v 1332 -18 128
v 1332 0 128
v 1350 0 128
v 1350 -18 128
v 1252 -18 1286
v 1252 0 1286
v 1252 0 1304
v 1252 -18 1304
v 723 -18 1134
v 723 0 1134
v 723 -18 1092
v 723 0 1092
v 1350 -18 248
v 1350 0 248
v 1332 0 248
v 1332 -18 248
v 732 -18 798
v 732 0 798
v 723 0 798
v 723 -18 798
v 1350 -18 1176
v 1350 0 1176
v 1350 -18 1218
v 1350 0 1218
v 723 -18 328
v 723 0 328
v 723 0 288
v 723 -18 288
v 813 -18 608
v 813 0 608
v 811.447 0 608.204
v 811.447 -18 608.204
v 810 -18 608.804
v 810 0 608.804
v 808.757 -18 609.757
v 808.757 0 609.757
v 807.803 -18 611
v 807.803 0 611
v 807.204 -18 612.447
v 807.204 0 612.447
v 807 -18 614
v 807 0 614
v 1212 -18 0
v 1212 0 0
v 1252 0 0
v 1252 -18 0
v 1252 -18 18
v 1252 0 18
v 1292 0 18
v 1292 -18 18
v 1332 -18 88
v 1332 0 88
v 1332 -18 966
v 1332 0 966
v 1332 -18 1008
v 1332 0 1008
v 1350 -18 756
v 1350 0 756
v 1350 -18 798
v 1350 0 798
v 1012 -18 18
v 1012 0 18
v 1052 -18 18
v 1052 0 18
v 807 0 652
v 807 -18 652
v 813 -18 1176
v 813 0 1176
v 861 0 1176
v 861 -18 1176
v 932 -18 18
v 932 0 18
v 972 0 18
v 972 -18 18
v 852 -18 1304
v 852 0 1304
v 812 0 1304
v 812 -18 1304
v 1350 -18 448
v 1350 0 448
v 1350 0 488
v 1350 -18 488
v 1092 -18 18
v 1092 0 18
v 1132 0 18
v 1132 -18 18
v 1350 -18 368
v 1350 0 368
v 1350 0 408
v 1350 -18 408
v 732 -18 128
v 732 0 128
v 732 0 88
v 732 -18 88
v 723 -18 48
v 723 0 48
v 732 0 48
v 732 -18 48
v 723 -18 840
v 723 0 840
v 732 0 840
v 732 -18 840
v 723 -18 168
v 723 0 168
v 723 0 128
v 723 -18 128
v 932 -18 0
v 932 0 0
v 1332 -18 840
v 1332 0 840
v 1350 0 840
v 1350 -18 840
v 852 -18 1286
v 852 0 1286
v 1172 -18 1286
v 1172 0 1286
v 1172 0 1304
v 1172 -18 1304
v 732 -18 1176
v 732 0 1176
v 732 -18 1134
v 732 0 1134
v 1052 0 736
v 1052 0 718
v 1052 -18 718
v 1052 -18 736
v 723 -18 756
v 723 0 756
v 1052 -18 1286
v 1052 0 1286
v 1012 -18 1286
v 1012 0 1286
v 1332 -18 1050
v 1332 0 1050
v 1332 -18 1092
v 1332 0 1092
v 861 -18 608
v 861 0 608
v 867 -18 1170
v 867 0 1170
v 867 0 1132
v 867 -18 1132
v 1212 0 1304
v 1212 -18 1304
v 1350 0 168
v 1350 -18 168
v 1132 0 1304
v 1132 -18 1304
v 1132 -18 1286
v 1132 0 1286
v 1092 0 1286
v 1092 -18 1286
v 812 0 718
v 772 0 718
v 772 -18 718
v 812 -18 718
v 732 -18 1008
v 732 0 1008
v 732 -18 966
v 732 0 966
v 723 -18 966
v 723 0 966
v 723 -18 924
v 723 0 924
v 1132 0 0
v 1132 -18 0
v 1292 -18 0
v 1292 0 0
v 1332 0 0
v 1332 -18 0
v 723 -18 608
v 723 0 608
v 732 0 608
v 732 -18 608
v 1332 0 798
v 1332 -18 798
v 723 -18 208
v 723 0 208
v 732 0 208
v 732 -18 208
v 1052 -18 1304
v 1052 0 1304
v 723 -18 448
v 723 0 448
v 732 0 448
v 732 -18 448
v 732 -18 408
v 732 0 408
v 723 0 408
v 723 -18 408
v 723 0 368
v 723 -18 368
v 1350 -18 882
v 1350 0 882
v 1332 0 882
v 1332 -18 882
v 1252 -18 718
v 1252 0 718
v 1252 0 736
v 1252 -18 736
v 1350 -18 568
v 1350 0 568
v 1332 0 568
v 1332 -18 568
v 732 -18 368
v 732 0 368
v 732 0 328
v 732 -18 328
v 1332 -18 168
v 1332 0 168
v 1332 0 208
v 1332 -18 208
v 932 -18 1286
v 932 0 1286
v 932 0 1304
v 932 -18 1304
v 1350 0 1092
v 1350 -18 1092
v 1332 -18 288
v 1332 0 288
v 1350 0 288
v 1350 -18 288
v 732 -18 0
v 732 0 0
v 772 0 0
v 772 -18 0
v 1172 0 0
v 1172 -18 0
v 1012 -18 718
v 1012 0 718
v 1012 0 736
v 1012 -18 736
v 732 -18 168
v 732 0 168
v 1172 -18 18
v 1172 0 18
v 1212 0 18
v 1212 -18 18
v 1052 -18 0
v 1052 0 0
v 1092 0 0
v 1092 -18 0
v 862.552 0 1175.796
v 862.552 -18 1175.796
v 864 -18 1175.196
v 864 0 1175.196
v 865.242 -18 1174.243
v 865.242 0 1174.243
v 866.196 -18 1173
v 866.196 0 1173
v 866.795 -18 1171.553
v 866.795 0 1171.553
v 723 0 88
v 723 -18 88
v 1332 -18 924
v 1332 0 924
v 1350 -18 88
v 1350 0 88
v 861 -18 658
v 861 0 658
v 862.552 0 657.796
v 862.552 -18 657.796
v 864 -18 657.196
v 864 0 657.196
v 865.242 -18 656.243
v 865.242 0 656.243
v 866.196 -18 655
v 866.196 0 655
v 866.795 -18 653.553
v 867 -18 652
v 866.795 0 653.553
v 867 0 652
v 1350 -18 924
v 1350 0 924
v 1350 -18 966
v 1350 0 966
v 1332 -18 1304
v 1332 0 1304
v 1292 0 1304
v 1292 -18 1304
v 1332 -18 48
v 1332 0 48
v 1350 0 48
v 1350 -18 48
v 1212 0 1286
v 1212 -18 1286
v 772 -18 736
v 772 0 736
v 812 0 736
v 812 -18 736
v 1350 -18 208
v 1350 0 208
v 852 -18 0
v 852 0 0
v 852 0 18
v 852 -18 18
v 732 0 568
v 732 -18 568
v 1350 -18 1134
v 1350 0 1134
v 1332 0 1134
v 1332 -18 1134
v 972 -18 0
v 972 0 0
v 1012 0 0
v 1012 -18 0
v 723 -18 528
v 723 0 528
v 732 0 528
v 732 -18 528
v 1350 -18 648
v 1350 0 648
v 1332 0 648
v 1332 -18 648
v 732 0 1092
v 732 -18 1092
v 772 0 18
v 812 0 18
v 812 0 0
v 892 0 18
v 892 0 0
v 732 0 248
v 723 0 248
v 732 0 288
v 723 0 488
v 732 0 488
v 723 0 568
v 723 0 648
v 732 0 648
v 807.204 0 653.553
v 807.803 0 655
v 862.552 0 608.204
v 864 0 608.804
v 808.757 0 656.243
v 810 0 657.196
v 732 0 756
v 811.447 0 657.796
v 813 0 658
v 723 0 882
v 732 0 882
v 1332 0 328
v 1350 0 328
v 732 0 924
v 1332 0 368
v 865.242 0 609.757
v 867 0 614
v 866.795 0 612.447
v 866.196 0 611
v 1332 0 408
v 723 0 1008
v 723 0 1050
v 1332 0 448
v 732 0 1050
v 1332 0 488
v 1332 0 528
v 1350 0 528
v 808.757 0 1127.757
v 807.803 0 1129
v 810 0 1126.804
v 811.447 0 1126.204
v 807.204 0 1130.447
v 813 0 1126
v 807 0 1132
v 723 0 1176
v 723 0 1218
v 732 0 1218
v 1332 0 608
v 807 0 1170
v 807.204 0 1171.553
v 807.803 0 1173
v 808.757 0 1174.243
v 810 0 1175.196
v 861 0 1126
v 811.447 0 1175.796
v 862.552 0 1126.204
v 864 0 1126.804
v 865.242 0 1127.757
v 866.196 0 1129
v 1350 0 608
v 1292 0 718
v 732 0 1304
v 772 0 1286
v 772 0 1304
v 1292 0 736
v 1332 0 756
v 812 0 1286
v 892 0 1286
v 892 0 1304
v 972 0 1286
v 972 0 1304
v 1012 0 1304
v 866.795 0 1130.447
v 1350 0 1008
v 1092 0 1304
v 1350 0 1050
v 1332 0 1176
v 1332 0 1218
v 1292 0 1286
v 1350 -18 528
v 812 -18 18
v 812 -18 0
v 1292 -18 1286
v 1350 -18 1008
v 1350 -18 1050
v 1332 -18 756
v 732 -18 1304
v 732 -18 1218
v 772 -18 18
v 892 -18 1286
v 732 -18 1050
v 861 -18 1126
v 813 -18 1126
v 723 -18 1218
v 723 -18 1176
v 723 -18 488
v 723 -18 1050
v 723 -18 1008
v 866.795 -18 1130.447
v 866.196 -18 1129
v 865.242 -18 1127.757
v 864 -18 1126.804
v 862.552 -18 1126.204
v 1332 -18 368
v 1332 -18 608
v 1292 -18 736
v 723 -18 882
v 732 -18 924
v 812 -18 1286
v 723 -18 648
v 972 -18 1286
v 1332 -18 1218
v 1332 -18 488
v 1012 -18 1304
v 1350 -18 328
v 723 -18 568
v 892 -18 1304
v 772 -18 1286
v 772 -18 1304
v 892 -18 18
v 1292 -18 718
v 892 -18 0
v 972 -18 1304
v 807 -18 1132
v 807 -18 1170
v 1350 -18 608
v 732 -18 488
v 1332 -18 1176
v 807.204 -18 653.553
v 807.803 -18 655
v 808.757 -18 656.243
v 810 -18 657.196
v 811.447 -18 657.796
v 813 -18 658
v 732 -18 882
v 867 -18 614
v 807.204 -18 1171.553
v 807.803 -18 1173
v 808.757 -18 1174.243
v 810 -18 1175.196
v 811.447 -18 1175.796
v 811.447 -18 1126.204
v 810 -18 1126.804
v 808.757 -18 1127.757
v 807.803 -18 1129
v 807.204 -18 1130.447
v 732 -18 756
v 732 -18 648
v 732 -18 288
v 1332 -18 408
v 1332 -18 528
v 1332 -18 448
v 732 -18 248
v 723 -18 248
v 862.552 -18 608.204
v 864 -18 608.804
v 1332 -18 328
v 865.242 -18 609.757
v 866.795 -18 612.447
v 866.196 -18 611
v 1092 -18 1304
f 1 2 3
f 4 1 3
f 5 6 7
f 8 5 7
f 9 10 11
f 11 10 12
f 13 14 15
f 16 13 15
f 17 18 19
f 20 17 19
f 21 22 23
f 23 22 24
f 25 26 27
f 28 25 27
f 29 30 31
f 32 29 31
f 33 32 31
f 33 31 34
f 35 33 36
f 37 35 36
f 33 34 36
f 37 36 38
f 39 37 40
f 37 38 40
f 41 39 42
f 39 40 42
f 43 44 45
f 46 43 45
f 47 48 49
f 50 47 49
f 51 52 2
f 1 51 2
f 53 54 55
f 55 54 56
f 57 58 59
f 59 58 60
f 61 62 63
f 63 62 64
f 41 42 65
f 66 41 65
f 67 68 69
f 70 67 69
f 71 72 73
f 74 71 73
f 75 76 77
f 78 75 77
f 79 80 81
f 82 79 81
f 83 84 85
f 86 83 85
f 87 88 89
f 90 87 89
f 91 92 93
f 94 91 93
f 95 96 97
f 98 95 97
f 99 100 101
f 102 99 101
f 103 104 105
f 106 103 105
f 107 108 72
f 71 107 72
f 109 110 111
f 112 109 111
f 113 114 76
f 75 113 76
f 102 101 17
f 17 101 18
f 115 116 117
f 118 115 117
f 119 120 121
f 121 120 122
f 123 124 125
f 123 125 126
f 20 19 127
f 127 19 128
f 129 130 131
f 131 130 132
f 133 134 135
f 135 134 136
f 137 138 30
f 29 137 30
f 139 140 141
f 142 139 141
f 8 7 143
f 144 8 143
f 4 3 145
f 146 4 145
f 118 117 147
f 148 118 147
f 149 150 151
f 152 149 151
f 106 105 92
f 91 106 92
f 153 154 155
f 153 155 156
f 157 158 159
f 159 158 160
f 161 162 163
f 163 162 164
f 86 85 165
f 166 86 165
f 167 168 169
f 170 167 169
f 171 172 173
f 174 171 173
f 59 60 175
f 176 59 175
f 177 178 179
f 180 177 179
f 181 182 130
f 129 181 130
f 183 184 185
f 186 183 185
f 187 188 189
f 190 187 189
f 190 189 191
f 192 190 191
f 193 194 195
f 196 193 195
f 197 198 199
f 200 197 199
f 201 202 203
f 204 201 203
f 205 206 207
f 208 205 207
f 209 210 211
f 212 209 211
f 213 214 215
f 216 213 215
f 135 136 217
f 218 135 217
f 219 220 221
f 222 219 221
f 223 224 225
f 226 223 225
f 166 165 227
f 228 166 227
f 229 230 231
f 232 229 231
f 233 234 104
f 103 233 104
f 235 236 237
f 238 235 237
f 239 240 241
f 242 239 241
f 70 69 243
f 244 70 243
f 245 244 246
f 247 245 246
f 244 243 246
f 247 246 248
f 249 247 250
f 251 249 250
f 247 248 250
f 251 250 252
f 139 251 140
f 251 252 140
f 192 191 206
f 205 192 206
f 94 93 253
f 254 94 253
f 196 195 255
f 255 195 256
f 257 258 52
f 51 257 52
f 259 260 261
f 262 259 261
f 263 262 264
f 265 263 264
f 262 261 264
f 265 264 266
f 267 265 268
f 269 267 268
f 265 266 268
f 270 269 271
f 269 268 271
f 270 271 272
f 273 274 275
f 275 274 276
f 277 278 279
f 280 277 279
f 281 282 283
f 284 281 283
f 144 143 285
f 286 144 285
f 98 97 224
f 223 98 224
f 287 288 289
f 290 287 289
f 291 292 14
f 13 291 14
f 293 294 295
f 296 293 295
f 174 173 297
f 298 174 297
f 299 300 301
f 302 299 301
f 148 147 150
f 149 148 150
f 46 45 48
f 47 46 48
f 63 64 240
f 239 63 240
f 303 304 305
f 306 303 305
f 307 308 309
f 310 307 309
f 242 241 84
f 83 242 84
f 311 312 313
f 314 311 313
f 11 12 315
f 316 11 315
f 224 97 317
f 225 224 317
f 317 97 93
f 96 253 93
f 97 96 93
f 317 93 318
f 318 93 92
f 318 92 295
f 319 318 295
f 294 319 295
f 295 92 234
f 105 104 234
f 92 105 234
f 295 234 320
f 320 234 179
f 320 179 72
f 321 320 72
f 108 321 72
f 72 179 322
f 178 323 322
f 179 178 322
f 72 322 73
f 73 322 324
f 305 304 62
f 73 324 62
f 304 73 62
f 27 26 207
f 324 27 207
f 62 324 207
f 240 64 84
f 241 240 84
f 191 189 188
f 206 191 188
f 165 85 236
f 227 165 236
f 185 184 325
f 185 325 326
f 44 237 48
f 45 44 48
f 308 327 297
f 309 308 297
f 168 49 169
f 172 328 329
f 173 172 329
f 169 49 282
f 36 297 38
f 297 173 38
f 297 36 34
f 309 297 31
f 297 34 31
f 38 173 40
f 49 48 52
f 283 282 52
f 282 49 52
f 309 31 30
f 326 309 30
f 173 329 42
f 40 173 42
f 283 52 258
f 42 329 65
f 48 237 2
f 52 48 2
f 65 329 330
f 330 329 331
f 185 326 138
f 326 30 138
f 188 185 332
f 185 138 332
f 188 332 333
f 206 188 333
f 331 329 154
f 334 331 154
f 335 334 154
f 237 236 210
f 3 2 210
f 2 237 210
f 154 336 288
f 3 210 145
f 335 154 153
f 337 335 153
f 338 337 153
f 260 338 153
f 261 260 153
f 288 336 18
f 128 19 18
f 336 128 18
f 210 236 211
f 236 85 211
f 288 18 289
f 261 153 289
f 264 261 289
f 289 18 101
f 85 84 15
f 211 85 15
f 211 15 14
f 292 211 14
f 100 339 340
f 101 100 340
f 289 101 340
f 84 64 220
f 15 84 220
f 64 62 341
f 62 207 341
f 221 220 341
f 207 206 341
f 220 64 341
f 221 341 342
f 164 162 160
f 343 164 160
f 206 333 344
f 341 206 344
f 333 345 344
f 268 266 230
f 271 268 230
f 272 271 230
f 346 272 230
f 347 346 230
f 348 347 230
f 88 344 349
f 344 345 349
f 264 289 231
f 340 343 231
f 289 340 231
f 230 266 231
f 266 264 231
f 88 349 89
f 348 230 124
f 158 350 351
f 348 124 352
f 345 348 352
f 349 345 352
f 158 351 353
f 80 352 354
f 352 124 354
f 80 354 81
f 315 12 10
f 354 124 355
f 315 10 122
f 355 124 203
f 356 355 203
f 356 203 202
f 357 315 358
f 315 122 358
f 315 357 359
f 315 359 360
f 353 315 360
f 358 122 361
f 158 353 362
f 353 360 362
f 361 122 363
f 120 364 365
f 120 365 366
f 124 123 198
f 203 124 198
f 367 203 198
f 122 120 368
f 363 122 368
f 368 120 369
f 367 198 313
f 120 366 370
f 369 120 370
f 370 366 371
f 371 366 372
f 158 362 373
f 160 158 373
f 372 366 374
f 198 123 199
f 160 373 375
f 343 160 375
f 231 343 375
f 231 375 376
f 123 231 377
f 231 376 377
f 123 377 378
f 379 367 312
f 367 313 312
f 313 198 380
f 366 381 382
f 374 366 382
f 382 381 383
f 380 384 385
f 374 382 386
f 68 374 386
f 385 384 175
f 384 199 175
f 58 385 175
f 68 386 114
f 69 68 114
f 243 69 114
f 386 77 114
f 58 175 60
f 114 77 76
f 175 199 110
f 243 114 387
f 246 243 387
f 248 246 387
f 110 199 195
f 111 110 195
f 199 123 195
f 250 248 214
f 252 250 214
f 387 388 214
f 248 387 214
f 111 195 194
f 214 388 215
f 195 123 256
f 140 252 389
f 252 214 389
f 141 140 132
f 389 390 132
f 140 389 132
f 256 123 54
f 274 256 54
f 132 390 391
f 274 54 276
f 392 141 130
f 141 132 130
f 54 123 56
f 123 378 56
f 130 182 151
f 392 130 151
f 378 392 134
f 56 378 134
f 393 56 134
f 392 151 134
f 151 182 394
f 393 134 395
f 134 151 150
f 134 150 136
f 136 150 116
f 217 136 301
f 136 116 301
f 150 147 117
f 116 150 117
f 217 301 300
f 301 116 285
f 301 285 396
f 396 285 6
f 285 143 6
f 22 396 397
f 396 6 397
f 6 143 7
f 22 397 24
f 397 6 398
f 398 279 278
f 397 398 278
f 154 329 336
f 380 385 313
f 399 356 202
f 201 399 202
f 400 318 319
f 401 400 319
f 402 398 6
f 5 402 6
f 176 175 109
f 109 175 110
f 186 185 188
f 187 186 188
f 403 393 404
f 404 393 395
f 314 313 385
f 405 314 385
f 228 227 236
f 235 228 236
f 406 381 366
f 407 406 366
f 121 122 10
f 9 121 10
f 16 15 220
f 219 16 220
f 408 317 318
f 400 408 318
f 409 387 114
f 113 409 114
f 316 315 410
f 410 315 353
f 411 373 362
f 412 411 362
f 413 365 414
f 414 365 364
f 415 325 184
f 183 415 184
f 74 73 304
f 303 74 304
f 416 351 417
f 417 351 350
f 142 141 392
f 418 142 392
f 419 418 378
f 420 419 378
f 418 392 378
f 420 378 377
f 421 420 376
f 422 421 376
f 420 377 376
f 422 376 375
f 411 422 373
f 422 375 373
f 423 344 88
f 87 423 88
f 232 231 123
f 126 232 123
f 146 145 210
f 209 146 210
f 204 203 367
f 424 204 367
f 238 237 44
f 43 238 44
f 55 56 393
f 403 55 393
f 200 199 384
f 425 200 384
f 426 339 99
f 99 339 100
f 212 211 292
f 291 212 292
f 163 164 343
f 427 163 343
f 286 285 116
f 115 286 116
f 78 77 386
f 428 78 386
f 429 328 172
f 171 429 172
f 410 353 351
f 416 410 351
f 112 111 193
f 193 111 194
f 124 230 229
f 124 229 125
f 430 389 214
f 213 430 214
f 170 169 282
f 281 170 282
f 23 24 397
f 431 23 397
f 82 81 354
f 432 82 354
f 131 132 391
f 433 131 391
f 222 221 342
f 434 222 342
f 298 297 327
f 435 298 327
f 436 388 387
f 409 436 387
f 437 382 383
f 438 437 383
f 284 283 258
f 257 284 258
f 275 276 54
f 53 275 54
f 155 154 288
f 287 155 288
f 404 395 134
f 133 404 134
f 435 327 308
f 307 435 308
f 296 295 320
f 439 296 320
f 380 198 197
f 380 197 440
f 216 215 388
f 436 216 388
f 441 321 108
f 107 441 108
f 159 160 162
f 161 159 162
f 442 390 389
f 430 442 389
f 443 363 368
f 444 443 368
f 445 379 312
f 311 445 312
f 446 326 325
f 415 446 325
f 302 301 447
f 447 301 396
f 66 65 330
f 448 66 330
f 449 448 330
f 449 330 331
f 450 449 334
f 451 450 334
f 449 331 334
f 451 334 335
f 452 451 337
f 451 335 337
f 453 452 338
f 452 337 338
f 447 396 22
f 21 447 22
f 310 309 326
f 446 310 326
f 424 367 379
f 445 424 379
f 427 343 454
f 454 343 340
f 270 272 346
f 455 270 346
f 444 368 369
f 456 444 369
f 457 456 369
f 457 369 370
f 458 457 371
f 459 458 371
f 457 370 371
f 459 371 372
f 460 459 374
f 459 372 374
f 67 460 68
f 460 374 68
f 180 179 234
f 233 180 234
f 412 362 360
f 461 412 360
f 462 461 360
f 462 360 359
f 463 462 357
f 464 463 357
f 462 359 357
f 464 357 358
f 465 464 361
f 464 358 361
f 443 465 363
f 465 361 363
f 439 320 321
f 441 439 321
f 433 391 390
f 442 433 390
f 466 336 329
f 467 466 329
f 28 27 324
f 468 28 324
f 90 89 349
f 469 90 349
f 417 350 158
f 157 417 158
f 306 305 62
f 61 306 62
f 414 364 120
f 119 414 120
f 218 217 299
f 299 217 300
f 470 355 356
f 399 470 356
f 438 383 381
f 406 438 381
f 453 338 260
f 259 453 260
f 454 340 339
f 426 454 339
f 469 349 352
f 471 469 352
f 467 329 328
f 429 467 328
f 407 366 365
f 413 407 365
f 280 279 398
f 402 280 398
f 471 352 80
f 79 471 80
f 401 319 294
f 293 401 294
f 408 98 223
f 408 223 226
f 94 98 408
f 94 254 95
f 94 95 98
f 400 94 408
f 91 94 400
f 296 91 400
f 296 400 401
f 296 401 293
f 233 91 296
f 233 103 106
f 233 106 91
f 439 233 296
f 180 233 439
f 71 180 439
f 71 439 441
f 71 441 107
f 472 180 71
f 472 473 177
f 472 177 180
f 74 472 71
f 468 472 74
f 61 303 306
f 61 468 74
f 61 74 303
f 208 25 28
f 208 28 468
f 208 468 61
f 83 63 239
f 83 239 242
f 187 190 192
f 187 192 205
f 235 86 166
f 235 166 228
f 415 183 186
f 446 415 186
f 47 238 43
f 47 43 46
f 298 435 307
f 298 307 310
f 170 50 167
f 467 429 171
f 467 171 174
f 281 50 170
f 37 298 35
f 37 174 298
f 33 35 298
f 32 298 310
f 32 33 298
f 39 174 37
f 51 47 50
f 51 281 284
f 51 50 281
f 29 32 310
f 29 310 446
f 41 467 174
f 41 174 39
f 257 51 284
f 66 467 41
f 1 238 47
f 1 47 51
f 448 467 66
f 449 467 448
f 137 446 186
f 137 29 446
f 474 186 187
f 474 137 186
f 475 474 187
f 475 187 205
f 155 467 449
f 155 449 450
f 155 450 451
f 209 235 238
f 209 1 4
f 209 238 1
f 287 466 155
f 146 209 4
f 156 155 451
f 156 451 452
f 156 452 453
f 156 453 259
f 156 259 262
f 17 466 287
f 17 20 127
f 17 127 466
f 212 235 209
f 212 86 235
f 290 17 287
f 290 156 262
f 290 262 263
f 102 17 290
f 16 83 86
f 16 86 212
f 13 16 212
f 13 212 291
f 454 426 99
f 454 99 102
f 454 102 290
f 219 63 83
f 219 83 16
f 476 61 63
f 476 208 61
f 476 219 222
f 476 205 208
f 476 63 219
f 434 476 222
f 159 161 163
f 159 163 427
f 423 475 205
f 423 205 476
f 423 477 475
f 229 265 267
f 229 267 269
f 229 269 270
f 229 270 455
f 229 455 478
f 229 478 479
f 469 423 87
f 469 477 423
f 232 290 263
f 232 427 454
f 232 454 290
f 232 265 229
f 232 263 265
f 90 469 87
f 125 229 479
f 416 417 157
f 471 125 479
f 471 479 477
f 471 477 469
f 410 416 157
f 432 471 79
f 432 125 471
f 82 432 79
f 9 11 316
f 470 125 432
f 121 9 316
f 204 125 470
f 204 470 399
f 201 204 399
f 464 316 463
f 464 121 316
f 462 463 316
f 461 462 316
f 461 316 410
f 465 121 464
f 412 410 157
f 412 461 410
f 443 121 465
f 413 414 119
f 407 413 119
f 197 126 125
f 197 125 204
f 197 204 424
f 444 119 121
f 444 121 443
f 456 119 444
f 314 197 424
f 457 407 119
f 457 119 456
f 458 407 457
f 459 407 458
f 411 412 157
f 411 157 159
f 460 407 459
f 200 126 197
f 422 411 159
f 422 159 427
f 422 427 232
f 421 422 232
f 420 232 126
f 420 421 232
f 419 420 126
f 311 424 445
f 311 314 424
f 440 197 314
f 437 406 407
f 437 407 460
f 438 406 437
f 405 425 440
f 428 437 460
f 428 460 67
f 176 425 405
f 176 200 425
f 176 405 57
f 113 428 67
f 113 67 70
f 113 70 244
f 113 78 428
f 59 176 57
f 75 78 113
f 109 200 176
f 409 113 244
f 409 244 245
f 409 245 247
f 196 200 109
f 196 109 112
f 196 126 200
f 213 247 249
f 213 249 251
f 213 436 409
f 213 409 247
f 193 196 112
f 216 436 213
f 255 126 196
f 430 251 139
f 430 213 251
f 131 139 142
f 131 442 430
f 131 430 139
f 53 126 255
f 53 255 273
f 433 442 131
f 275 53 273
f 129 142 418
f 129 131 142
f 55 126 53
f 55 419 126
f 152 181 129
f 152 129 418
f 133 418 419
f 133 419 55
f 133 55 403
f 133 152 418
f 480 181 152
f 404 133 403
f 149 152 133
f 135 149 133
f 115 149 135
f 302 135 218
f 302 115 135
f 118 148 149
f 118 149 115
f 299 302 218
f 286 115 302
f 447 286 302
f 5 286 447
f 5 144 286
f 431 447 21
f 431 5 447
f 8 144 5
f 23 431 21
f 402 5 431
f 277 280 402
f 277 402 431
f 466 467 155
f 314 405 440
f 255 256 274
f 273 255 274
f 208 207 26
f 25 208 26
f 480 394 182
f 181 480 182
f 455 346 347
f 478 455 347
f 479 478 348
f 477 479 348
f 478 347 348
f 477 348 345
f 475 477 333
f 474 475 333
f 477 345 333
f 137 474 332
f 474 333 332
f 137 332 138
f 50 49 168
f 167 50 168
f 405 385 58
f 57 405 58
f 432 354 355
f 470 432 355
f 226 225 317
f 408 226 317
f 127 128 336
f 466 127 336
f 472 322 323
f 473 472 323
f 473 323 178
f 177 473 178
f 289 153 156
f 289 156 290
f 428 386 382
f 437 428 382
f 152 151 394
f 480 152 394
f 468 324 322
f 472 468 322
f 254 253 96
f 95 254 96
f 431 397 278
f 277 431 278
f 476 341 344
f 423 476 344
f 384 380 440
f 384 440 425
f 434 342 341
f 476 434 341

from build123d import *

# Parameters (mm, degrees)
F0_W     = 40
F0_H     = 18
F1_DEPTH = 18


with BuildPart() as f1:
    # F0 (on Front) → F1 (new body)
    with BuildSketch(Plane.XZ):
        Polygon((1349.999516, 1218), (1331.999516, 1218), (1331.999516, 1304), (1291.999516, 1304), (1291.999516, 1286), (1251.999516, 1286), (1251.999516, 1304), (1211.999516, 1304), (1211.999516, 1286), (1171.999516, 1286), (1171.999516, 1304), (1131.999516, 1304), (1131.999516, 1286), (1091.999516, 1286), (1091.999516, 1304), (1051.999516, 1304), (1051.999516, 1286), (1011.999516, 1286), (1011.999516, 1304), (971.999516, 1304), (971.999516, 1286), (931.999516, 1286), (931.999516, 1304), (891.999516, 1304), (891.999516, 1286), (851.999516, 1286), (851.999516, 1304), (811.999516, 1304), (811.999516, 1286), (771.999516, 1286), (771.999516, 1304), (731.999516, 1304), (731.999516, 1218), (722.999516, 1218), (722.999516, 1176), (731.999516, 1176), (731.999516, 1134), (722.999516, 1134), (722.999516, 1092), (731.999516, 1092), (731.999516, 1050), (722.999516, 1050), (722.999516, 1008), (731.999516, 1008), (731.999516, 966), (722.999516, 966), (722.999516, 924), (731.999516, 924), (731.999516, 882), (722.999516, 882), (722.999516, 840), (731.999516, 840), (731.999516, 798), (722.999516, 798), (722.999516, 756), (731.999516, 756), (731.999516, 648), (722.999516, 648), (722.999516, 608), (731.999516, 608), (731.999516, 568), (722.999516, 568), (722.999516, 528), (731.999516, 528), (731.999516, 488), (722.999516, 488), (722.999516, 448), (731.999516, 448), (731.999516, 408), (722.999516, 408), (722.999516, 368), (731.999516, 368), (731.999516, 328), (722.999516, 328), (722.999516, 288), (731.999516, 288), (731.999516, 248), (722.999516, 248), (722.999516, 208), (731.999516, 208), (731.999516, 168), (722.999516, 168), (722.999516, 128), (731.999516, 128), (731.999516, 88), (722.999516, 88), (722.999516, 48), (731.999516, 48), (731.999516, 0), (771.999516, 0), (771.999516, 18), (811.999516, 18), (811.999516, 0), (851.999516, 0), (851.999516, 18), (891.999516, 18), (891.999516, 0), (931.999516, 0), (931.999516, 18), (971.999516, 18), (971.999516, 0), (1011.999516, 0), (1011.999516, 18), (1051.999516, 18), (1051.999516, 0), (1091.999516, 0), (1091.999516, 18), (1131.999516, 18), (1131.999516, 0), (1171.999516, 0), (1171.999516, 18), (1211.999516, 18), (1211.999516, 0), (1251.999516, 0), (1251.999516, 18), (1291.999516, 18), (1291.999516, 0), (1331.999516, 0), (1331.999516, 48), (1349.999516, 48), (1349.999516, 88), (1331.999516, 88), (1331.999516, 128), (1349.999516, 128), (1349.999516, 168), (1331.999516, 168), (1331.999516, 208), (1349.999516, 208), (1349.999516, 248), (1331.999516, 248), (1331.999516, 288), (1349.999516, 288), (1349.999516, 328), (1331.999516, 328), (1331.999516, 368), (1349.999516, 368), (1349.999516, 408), (1331.999516, 408), (1331.999516, 448), (1349.999516, 448), (1349.999516, 488), (1331.999516, 488), (1331.999516, 528), (1349.999516, 528), (1349.999516, 568), (1331.999516, 568), (1331.999516, 608), (1349.999516, 608), (1349.999516, 648), (1331.999516, 648), (1331.999516, 756), (1349.999516, 756), (1349.999516, 798), (1331.999516, 798), (1331.999516, 840), (1349.999516, 840), (1349.999516, 882), (1331.999516, 882), (1331.999516, 924), (1349.999516, 924), (1349.999516, 966), (1331.999516, 966), (1331.999516, 1008), (1349.999516, 1008), (1349.999516, 1050), (1331.999516, 1050), (1331.999516, 1092), (1349.999516, 1092), (1349.999516, 1134), (1331.999516, 1134), (1331.999516, 1176), (1349.999516, 1176), align=None)
        with BuildLine():
            Line((806.999516, 614), (806.999516, 652))
            ThreePointArc((806.999516, 652), (808.756876, 656.242641), (812.999516, 658))
            Line((812.999516, 658), (860.999516, 658))
            ThreePointArc((860.999516, 658), (865.242157, 656.242641), (866.999516, 652))
            Line((866.999516, 652), (866.999516, 614))
            ThreePointArc((866.999516, 614), (865.242157, 609.757359), (860.999516, 608))
            Line((860.999516, 608), (812.999516, 608))
            ThreePointArc((812.999516, 608), (808.756876, 609.757359), (806.999516, 614))
        make_face(mode=Mode.SUBTRACT)
        with Locations((791.999516, 727)):
            Rectangle(F0_W, F0_H, mode=Mode.SUBTRACT)
        with Locations((1031.999516, 727)):
            Rectangle(F0_W, F0_H, mode=Mode.SUBTRACT)
        with BuildLine():
            ThreePointArc((860.999516, 1176), (865.242157, 1174.242641), (866.999516, 1170))
            Line((866.999516, 1170), (866.999516, 1132))
            ThreePointArc((866.999516, 1132), (865.242157, 1127.757359), (860.999516, 1126))
            Line((860.999516, 1126), (812.999516, 1126))
            ThreePointArc((812.999516, 1126), (808.756876, 1127.757359), (806.999516, 1132))
            Line((806.999516, 1132), (806.999516, 1170))
            ThreePointArc((806.999516, 1170), (808.756876, 1174.242641), (812.999516, 1176))
            Line((812.999516, 1176), (860.999516, 1176))
        make_face(mode=Mode.SUBTRACT)
        with Locations((1271.999516, 727)):
            Rectangle(F0_W, F0_H, mode=Mode.SUBTRACT)
    extrude(amount=F1_DEPTH)


solid = f1.part
